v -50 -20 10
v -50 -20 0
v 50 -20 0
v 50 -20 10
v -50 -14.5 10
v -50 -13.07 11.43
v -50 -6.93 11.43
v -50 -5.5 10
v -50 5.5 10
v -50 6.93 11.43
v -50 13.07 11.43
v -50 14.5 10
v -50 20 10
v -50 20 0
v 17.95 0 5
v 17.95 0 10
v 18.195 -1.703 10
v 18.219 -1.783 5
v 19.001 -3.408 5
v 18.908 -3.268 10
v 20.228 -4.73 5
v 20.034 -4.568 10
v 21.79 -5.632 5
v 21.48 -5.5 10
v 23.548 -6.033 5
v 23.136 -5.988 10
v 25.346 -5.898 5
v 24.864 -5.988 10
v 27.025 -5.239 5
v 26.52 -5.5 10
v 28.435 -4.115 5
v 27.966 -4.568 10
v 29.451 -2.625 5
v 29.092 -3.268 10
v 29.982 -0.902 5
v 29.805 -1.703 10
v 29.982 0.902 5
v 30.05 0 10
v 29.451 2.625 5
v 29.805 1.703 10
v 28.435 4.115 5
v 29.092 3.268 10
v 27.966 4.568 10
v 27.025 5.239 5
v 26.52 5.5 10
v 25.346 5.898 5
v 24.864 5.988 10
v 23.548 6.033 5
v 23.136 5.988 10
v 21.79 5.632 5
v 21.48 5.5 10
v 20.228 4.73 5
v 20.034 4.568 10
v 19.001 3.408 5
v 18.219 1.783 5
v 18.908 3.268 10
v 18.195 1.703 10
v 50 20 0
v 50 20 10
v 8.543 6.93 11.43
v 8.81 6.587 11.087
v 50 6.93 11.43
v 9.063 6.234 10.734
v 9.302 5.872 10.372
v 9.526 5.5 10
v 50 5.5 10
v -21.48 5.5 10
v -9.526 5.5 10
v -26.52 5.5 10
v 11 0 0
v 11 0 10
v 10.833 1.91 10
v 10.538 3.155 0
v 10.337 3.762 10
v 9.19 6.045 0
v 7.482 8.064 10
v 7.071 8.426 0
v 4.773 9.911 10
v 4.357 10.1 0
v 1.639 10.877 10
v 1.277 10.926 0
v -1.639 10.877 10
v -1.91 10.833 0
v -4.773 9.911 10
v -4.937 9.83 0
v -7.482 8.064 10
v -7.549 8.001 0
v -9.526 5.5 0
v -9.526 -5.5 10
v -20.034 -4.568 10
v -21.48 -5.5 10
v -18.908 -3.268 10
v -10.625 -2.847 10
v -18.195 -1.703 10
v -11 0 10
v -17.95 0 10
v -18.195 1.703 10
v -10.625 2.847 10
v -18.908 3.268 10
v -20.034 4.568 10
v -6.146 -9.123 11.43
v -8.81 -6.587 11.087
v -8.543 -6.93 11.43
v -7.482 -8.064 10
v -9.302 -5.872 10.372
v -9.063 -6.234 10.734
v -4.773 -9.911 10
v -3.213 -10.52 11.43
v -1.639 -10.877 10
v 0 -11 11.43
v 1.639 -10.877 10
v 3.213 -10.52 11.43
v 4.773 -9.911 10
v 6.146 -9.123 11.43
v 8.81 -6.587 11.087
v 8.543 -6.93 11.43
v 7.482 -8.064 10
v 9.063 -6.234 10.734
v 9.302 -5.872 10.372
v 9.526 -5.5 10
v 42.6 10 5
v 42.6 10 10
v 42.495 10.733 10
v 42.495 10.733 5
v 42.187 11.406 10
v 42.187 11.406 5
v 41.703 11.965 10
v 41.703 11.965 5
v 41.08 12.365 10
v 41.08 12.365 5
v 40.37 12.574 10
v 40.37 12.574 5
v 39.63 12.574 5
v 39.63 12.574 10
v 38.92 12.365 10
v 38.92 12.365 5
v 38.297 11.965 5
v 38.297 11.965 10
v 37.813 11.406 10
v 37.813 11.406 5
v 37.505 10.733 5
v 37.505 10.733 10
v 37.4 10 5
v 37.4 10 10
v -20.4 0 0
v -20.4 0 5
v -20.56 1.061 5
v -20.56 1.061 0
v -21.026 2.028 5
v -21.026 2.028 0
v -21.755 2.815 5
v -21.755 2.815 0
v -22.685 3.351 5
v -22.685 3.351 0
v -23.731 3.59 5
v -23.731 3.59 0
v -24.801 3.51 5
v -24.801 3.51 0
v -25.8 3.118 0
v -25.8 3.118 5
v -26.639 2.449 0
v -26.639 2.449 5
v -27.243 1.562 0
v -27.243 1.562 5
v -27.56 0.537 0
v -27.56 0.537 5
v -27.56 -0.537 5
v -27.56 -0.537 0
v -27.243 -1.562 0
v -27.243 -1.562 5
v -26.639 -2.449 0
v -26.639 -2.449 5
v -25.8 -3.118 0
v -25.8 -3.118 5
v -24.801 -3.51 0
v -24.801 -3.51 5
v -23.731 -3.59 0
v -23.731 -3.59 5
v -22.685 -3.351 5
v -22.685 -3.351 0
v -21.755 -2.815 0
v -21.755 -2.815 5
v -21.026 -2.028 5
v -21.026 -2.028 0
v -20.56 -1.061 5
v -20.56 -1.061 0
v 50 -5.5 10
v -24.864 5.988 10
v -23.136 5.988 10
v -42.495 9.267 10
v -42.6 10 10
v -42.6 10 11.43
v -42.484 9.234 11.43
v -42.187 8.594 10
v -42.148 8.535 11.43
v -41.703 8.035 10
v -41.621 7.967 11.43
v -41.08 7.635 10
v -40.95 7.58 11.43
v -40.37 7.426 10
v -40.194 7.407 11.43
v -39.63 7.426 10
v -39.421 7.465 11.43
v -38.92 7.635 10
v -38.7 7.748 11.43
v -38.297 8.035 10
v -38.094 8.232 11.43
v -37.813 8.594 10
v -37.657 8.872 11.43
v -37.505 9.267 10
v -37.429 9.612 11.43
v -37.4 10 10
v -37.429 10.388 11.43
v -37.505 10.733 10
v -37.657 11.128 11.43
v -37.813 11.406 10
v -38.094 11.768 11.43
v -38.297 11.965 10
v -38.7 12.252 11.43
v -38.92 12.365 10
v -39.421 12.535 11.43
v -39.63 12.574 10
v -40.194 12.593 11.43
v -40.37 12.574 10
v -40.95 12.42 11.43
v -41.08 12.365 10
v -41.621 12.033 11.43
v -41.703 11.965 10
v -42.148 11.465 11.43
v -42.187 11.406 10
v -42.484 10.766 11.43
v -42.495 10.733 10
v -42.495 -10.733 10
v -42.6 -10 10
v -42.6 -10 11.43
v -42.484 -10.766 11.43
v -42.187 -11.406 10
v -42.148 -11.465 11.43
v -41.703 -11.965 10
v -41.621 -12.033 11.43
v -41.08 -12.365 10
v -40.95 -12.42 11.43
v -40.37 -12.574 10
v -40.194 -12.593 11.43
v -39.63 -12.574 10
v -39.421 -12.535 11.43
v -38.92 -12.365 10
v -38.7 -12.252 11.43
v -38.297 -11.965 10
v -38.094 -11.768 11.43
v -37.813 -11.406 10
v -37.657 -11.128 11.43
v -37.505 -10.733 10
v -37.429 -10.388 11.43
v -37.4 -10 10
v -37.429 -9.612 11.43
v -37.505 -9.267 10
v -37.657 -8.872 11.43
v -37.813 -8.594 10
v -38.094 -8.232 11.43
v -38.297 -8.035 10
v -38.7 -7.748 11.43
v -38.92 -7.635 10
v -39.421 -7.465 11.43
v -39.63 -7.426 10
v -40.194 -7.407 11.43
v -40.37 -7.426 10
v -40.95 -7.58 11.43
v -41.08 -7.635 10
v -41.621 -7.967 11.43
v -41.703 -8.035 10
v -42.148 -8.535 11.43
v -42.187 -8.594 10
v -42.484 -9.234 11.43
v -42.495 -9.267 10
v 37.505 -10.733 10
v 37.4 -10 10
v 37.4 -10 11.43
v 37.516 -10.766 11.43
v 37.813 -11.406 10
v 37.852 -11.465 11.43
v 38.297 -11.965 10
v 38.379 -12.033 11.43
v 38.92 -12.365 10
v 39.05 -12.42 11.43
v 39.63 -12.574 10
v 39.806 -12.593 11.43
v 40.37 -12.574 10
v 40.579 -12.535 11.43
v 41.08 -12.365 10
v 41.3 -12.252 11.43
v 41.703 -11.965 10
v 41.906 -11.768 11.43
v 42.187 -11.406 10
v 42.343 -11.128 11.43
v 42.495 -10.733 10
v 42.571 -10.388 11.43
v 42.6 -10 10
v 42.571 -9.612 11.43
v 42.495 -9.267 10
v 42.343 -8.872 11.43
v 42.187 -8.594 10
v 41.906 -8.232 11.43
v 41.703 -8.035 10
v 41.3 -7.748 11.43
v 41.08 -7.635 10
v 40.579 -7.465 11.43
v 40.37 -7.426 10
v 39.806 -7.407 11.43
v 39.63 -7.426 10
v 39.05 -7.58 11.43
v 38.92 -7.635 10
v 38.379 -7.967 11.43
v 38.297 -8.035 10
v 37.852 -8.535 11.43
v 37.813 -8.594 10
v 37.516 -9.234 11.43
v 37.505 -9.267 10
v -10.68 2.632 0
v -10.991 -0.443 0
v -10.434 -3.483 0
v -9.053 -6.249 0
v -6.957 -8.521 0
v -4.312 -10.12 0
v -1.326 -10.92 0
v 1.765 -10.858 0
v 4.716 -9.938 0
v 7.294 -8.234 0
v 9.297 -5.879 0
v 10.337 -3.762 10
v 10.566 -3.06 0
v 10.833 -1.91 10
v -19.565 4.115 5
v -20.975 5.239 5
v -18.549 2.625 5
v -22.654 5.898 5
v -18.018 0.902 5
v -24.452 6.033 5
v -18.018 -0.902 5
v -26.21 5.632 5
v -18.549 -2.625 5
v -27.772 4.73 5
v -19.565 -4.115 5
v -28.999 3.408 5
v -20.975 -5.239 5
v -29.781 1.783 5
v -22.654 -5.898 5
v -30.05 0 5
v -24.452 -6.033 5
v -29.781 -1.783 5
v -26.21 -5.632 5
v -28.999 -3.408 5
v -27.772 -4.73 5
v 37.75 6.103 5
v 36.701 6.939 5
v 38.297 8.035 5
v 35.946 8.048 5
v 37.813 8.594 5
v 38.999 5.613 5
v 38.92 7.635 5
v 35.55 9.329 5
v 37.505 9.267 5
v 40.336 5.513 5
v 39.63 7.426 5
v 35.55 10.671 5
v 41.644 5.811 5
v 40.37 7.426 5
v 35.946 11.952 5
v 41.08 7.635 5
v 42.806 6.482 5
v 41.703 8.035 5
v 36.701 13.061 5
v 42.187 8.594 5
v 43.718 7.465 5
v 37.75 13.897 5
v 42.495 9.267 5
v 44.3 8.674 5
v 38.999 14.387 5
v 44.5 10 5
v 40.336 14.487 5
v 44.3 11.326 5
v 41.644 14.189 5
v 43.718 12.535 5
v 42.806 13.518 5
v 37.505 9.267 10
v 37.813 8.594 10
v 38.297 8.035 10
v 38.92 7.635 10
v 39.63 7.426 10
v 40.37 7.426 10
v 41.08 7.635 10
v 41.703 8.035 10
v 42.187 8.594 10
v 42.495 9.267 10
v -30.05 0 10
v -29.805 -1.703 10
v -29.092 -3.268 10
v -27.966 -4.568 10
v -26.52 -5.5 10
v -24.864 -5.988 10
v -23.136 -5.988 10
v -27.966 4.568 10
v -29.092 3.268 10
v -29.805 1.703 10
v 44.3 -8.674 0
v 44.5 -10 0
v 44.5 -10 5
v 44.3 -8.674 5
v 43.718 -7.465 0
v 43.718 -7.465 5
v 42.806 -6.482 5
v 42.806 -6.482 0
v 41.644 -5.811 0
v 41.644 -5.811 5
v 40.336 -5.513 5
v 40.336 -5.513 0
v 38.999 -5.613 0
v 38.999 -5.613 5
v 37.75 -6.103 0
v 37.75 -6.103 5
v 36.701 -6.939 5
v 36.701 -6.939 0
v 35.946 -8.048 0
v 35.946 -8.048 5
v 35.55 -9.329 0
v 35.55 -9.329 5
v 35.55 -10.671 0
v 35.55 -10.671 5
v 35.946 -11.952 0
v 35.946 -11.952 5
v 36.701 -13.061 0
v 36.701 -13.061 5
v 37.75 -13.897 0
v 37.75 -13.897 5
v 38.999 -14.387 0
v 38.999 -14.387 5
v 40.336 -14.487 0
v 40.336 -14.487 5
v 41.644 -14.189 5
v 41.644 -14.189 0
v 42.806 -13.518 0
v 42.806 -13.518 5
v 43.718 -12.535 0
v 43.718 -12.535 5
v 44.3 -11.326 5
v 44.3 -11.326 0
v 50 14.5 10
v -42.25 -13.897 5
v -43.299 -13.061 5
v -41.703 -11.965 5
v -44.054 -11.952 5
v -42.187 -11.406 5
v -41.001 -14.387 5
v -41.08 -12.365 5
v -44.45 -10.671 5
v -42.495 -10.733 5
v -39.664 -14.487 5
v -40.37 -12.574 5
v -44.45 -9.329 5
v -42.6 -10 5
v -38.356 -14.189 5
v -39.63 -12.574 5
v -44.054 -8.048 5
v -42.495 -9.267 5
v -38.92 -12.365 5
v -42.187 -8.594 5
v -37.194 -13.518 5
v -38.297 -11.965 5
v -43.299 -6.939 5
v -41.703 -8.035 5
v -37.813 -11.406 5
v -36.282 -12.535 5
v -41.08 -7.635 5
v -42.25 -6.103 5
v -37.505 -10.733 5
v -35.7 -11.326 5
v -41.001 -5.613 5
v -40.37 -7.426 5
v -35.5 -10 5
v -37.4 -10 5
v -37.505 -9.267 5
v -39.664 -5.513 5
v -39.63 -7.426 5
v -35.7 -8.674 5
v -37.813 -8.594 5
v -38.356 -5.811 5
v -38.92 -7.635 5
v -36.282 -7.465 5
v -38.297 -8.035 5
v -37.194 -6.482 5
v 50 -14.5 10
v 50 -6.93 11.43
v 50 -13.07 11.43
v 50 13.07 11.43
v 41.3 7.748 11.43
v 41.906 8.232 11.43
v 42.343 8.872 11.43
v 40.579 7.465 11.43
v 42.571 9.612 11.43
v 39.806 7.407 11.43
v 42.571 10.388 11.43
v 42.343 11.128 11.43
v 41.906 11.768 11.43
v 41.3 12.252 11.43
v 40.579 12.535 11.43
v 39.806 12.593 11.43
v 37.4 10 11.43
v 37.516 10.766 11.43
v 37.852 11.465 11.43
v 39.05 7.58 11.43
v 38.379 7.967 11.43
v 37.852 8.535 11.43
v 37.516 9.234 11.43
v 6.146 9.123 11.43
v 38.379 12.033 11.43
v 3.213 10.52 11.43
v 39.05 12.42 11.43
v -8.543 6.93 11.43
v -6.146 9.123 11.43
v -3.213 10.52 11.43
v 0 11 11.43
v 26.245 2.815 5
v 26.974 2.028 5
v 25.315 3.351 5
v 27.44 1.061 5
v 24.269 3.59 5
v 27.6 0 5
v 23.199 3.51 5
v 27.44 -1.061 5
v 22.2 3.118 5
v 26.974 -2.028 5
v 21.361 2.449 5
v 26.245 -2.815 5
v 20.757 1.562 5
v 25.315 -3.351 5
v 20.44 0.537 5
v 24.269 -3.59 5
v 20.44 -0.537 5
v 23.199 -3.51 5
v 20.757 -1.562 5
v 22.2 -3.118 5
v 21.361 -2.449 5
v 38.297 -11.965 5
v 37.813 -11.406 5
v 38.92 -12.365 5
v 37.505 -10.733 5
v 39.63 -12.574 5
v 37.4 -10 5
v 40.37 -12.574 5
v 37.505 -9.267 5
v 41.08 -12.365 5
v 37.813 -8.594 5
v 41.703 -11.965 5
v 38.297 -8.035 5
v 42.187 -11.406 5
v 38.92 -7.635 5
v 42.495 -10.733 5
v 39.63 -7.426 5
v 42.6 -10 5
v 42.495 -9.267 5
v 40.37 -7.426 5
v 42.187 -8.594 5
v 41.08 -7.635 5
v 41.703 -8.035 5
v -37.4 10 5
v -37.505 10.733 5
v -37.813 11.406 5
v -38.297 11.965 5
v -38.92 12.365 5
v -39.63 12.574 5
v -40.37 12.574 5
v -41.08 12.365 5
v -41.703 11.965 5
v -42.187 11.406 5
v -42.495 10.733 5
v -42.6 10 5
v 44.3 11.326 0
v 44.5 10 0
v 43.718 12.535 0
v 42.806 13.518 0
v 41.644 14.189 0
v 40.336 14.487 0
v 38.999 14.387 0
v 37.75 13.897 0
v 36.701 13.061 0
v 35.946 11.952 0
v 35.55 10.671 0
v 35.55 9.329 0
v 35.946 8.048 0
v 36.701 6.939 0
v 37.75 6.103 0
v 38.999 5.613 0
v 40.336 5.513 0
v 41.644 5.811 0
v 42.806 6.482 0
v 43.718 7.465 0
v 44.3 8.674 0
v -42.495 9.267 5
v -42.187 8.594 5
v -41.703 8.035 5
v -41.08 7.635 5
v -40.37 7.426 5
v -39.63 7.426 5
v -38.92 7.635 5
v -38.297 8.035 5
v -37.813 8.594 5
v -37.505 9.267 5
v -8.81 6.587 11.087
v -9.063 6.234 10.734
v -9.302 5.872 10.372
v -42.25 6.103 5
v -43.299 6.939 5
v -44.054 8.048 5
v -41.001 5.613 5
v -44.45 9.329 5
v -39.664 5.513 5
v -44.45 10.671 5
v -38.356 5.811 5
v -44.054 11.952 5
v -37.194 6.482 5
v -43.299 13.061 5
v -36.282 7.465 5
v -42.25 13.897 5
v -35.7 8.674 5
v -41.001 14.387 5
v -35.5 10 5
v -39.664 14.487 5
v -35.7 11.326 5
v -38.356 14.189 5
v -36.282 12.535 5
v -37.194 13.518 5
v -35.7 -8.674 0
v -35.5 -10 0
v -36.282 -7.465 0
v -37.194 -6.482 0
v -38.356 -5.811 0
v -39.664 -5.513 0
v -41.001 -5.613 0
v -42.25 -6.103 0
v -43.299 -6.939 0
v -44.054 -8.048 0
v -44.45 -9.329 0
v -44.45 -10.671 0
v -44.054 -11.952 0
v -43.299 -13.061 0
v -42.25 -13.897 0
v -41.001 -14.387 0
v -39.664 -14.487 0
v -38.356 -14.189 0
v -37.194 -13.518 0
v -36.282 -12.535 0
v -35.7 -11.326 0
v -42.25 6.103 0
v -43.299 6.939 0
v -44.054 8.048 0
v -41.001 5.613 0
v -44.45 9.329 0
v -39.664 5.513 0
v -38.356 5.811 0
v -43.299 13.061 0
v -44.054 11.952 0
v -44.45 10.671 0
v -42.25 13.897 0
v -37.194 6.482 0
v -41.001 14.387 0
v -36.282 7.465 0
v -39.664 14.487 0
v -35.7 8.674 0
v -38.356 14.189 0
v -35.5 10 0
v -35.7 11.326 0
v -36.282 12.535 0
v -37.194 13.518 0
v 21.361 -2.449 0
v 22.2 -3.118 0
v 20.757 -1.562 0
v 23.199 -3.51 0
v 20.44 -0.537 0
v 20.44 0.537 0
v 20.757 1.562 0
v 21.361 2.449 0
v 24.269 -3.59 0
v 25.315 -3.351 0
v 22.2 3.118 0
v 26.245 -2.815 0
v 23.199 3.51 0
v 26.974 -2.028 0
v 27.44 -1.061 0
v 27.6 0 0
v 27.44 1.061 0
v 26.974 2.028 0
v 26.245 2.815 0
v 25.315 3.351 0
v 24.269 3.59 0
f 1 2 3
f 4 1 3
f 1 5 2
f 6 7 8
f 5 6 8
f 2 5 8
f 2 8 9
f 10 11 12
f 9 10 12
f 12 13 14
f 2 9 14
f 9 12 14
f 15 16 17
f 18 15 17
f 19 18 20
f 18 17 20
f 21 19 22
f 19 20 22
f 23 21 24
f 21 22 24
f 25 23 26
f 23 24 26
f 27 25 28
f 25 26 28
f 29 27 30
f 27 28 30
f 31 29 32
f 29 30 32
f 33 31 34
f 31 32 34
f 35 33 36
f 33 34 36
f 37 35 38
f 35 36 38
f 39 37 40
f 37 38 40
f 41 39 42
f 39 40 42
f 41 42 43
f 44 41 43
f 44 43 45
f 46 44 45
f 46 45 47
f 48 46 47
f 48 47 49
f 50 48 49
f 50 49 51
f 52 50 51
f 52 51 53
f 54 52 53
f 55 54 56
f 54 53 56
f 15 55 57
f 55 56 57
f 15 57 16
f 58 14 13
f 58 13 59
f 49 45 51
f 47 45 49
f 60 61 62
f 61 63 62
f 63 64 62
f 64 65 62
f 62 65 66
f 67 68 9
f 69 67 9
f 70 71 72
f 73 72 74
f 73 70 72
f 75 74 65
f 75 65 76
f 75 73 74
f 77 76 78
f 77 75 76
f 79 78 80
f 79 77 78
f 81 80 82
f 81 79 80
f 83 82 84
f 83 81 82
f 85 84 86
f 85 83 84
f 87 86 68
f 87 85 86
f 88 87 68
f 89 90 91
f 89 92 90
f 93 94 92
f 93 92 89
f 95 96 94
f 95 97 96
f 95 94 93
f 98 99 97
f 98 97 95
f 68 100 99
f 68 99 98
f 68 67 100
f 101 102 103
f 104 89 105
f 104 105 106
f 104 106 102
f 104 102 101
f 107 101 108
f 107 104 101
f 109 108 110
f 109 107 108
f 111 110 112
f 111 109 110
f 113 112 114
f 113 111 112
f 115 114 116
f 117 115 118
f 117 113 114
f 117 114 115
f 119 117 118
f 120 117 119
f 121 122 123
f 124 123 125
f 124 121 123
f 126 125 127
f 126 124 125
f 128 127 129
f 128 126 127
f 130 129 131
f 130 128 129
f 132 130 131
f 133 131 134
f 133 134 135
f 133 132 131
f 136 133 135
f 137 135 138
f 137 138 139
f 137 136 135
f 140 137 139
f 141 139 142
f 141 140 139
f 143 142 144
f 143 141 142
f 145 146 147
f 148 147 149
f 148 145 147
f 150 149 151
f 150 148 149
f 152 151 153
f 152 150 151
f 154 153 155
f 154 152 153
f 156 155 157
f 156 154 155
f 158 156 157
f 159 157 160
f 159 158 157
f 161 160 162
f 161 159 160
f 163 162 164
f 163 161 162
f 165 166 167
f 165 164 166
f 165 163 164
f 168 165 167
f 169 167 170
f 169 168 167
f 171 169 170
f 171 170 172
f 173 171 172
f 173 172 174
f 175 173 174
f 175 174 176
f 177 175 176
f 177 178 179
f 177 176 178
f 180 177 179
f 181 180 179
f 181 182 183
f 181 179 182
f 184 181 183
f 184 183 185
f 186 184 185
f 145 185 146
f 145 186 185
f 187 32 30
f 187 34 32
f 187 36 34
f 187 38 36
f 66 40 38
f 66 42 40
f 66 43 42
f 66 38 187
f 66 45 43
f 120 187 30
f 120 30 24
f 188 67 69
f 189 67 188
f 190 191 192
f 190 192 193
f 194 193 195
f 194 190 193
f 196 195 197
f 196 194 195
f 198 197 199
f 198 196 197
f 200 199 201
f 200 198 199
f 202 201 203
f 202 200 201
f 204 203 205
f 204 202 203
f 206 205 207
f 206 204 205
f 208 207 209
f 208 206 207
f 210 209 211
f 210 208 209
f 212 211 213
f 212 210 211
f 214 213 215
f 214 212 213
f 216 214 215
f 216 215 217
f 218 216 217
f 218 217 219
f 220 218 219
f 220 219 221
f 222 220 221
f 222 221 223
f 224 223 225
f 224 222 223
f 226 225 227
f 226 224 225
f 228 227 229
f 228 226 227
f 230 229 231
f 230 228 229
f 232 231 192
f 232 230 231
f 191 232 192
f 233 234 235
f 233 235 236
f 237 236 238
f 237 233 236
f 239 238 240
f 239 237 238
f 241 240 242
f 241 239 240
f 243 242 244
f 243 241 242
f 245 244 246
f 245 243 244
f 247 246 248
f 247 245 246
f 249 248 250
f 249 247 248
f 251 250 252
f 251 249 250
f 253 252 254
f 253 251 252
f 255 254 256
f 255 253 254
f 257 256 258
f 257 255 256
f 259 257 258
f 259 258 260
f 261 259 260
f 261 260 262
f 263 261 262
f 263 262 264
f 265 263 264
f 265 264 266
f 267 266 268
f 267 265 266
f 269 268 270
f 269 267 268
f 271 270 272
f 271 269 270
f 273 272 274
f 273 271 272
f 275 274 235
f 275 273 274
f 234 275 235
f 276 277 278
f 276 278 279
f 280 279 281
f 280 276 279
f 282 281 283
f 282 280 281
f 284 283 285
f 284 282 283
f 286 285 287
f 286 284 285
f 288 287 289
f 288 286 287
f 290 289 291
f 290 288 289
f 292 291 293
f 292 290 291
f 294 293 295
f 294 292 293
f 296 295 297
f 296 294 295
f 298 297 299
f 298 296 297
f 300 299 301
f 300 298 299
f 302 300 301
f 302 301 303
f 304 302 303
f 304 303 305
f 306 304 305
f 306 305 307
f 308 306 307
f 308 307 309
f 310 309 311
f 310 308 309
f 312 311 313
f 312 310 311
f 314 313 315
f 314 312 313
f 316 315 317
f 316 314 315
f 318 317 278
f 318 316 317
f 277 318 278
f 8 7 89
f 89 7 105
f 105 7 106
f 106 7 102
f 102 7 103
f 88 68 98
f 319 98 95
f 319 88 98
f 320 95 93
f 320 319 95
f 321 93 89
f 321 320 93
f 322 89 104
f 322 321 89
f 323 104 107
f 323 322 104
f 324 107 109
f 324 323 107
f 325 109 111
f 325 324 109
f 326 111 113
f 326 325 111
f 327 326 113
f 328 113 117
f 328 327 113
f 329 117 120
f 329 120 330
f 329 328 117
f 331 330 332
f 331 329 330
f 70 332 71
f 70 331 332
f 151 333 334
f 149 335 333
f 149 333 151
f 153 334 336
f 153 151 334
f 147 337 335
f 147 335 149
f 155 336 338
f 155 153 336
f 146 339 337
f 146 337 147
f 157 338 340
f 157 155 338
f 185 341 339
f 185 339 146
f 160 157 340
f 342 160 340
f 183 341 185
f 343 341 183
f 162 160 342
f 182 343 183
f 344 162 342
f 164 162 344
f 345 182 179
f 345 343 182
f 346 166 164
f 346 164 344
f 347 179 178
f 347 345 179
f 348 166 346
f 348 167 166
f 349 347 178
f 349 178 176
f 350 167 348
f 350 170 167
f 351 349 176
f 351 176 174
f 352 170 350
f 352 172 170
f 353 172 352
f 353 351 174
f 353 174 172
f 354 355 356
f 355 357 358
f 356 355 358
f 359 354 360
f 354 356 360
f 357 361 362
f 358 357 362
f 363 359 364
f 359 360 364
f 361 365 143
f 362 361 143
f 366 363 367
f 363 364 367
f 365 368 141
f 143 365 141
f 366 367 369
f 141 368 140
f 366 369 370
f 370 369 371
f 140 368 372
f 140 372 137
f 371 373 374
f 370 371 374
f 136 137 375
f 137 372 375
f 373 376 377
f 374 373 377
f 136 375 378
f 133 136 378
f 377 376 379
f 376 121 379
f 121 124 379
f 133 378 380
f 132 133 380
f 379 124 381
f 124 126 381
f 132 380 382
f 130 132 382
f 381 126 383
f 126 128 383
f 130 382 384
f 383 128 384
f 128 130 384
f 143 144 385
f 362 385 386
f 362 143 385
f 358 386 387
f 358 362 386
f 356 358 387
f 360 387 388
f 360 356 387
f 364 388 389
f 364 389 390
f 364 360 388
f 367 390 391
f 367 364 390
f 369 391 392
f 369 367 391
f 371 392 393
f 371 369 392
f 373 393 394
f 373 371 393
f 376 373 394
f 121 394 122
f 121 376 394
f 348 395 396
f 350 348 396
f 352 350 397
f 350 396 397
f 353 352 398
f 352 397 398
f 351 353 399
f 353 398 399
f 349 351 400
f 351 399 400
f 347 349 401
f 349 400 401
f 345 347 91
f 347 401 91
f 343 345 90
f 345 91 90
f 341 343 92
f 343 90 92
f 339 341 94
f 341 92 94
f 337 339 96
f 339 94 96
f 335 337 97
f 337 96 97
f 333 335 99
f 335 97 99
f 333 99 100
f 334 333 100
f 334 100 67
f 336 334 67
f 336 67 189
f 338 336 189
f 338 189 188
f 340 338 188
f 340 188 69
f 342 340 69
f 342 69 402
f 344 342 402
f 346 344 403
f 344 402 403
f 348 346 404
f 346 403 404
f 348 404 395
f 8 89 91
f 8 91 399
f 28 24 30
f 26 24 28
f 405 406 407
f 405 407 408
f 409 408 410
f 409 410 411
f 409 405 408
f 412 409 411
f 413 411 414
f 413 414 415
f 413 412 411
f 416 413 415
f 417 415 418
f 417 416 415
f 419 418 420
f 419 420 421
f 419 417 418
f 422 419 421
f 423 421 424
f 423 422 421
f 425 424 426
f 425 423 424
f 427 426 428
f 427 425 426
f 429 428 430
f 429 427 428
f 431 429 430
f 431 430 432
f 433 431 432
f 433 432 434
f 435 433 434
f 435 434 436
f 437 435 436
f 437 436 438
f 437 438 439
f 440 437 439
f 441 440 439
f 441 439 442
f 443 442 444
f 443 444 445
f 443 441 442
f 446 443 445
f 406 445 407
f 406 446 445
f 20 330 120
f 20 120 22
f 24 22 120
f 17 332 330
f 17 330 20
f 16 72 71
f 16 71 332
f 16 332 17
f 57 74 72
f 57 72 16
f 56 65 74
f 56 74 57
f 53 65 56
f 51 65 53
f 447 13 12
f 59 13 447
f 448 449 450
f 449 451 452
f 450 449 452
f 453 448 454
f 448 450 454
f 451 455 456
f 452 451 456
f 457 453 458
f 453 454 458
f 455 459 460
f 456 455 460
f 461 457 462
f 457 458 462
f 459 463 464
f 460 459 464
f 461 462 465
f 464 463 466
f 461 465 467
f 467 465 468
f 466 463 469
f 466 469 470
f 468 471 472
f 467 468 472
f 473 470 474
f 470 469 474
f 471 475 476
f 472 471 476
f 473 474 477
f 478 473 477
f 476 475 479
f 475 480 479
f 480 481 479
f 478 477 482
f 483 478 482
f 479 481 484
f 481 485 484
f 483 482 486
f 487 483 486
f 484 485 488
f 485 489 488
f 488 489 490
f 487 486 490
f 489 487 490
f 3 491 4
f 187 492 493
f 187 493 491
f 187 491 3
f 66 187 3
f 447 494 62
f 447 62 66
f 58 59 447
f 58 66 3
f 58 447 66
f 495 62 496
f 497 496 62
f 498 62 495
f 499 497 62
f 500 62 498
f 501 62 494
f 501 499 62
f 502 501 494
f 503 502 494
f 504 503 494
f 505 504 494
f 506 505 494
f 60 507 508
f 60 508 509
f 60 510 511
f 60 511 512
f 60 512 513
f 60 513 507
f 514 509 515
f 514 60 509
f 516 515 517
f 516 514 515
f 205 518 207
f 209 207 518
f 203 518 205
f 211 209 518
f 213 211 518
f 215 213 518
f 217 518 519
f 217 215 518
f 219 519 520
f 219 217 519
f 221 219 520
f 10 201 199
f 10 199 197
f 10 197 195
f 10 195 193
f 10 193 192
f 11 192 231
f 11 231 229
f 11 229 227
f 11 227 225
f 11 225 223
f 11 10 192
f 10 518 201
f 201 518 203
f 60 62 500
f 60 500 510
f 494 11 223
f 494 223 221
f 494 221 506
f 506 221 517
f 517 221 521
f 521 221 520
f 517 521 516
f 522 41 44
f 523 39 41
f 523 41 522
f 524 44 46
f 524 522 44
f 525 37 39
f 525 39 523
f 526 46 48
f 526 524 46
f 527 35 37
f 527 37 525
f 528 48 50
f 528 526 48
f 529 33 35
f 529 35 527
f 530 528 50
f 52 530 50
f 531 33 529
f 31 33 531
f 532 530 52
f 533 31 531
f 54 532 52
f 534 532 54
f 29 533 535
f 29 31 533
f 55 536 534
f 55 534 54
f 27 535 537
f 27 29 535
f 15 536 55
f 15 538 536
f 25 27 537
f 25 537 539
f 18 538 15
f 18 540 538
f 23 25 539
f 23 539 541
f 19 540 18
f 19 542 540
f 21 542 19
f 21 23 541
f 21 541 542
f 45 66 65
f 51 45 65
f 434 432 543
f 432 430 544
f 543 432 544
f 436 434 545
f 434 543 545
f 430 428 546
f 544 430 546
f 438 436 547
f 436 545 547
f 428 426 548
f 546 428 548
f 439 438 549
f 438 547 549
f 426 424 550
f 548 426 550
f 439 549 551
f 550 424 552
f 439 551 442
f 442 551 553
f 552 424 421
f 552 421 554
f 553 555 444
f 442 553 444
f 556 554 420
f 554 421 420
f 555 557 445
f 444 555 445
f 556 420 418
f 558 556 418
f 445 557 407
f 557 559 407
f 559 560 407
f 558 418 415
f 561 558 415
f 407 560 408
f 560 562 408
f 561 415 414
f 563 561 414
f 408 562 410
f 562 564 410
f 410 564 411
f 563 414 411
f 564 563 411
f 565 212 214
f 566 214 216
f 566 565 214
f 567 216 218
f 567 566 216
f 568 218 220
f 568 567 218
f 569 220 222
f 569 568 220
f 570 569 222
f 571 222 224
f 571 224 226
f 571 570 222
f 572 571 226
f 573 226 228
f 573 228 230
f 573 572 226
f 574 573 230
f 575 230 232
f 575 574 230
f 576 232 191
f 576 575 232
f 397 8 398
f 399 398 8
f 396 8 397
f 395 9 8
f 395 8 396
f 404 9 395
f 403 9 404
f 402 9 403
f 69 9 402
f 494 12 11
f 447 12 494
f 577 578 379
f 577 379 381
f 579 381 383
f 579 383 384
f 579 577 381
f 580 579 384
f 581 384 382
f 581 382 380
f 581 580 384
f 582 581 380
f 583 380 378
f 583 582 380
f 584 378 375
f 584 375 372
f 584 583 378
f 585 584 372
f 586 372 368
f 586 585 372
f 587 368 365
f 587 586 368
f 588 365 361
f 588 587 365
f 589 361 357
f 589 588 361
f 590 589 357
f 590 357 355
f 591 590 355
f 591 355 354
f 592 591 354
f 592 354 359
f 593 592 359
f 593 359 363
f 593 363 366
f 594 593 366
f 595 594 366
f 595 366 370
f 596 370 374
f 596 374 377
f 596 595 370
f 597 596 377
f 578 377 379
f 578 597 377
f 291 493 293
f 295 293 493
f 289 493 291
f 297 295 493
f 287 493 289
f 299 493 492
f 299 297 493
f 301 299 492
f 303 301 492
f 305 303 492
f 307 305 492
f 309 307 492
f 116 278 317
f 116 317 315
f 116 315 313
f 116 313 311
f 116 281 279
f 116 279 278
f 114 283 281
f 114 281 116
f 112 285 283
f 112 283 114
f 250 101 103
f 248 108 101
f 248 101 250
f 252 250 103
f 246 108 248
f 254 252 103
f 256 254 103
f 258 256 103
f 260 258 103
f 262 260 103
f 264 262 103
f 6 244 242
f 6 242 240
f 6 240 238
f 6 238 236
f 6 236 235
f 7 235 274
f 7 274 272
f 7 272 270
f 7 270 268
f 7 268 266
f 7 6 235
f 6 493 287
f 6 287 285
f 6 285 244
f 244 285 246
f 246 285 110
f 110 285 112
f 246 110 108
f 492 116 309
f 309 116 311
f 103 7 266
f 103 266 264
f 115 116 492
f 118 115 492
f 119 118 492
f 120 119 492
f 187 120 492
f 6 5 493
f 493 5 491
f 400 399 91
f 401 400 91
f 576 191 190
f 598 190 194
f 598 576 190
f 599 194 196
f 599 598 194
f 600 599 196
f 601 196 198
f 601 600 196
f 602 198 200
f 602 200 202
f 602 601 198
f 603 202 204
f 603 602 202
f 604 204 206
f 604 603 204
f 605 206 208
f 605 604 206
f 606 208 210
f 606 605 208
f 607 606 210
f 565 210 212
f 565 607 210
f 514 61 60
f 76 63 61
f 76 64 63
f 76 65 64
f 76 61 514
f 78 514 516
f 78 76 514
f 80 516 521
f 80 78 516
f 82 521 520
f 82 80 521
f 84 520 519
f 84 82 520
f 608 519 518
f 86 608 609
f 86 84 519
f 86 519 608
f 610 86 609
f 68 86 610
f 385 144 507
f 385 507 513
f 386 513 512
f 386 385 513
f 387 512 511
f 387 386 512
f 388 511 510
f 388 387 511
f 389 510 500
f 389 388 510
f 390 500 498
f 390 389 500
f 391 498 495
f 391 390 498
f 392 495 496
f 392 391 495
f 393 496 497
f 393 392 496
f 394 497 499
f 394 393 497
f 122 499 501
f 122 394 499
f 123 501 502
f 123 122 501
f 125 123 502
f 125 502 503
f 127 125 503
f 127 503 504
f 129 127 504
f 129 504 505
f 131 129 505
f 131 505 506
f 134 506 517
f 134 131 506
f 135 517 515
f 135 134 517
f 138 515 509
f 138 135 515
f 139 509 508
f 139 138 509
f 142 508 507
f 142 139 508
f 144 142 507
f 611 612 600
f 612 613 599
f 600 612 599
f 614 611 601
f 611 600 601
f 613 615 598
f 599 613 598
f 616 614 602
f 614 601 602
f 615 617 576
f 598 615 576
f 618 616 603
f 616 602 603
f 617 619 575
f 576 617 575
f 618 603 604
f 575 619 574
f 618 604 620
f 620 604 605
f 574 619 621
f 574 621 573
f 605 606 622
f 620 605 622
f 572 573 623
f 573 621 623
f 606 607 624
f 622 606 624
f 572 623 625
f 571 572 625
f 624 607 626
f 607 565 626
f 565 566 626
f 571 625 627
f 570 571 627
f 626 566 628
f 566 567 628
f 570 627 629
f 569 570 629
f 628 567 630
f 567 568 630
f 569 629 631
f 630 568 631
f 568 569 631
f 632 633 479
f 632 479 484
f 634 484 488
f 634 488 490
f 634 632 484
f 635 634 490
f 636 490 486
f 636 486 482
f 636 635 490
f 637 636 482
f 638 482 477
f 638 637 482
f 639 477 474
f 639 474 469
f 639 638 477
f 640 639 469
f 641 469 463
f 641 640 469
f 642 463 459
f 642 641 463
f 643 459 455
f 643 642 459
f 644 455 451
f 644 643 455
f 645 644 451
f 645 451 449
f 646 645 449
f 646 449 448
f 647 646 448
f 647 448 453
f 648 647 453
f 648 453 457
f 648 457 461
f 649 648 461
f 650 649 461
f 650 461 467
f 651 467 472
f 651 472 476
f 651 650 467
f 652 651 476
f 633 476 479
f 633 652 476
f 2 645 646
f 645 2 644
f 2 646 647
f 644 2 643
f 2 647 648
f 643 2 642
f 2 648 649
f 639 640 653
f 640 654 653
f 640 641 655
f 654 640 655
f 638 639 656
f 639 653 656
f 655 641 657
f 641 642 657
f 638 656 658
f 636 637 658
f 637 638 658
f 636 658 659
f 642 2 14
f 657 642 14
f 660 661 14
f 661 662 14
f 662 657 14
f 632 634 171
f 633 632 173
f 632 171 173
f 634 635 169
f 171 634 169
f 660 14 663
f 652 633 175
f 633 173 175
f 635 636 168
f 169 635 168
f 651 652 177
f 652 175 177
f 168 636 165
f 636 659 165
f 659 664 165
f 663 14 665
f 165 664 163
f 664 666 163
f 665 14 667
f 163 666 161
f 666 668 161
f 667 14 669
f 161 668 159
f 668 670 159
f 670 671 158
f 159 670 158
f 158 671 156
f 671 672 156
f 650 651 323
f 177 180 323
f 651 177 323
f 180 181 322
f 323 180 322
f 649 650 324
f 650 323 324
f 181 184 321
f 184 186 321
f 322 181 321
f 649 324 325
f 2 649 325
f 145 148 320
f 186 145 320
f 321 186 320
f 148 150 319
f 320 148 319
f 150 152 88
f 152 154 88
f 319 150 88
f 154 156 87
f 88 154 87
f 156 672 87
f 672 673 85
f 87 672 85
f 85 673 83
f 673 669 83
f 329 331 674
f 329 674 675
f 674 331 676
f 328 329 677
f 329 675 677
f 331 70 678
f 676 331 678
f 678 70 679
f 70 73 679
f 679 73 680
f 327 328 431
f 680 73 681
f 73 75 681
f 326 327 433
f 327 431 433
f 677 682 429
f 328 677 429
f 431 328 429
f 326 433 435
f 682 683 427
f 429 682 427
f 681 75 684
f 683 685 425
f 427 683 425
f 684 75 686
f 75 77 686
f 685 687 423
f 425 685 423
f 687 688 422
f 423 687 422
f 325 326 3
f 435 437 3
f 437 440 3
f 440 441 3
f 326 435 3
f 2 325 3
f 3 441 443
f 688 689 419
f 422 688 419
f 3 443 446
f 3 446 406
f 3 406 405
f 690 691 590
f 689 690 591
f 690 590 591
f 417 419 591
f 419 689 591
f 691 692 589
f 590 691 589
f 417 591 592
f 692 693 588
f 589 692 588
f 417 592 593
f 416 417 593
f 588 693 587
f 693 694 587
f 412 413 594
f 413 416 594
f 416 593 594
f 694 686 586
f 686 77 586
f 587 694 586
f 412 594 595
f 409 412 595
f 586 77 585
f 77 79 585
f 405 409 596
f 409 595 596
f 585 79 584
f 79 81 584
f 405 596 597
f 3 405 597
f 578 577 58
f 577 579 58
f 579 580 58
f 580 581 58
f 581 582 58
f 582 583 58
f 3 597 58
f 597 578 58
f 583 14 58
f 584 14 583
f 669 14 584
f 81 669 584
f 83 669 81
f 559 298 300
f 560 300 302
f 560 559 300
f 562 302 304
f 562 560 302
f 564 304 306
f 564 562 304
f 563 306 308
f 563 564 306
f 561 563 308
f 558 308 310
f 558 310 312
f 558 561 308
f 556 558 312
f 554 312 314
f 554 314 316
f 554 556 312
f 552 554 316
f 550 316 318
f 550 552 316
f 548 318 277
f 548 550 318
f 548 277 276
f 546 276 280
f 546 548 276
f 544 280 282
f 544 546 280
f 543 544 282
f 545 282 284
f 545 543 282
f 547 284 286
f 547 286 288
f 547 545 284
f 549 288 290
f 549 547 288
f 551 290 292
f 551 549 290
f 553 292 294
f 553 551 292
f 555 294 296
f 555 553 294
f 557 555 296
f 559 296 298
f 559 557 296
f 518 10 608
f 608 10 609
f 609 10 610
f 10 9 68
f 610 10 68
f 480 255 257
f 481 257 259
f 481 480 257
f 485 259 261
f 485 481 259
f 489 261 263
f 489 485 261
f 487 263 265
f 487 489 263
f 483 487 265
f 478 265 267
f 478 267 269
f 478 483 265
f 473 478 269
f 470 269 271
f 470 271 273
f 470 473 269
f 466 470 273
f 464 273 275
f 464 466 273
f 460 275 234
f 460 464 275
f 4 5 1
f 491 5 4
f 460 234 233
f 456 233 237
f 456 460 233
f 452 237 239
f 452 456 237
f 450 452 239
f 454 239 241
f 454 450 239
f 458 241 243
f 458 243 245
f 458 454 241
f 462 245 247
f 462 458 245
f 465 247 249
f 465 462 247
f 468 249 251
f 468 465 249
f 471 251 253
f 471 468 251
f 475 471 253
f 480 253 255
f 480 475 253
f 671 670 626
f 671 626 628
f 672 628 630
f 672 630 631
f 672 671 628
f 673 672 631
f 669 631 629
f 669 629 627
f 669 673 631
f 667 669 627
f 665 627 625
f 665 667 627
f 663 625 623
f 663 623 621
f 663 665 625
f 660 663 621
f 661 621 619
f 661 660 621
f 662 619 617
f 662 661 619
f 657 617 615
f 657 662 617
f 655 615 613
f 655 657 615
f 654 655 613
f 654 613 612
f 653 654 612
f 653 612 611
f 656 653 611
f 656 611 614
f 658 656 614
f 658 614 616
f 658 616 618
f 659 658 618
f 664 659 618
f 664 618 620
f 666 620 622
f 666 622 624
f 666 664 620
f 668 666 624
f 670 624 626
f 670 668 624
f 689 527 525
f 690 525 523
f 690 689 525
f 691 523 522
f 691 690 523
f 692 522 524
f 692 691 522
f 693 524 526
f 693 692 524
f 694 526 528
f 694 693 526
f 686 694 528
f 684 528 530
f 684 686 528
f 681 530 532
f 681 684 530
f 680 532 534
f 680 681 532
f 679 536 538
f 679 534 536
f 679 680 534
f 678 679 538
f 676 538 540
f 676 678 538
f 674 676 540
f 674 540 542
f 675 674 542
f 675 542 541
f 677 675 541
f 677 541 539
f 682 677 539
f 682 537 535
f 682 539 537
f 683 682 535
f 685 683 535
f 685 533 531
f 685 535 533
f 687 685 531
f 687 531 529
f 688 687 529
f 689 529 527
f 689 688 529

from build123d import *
from build123d.topology import SkipClean

# Parameters (mm, degrees)
SKETCH1_W               = 100
SKETCH1_H               = 40
SKETCH1_R               = 11
SKETCH1_R_2             = 2.6
SKETCH1_R_3             = 3.6
BOSS_EXTRUDE1_DEPTH     = 10
CUT_EXTRUDE1_START      = 10
SKETCH2_R               = 6.05
CUT_EXTRUDE1_DEPTH      = 5
SKETCH3_R               = 4.5
CUT_EXTRUDE2_DEPTH      = 5
BOSS_EXTRUDE3_START     = -50
SKETCH4_W               = 1.43
SKETCH4_H               = 9
BOSS_EXTRUDE3_DEPTH     = 100
CHAMFER1_SIZE           = 1.43
CUT_EXTRUDE4_DEPTH      = 56.051293354
CUT_EXTRUDE4_DEPTH_BACK = 56.051293354
SKETCH5_R               = 11
SKETCH5_R_2             = 2.6


with BuildPart() as part:
    # Sketch1 → Boss-Extrude1 (new body)
    with BuildSketch(Plane.XY):
        Rectangle(SKETCH1_W, SKETCH1_H)
        Circle(SKETCH1_R, mode=Mode.SUBTRACT)
        with Locations((-40, 10)):
            Circle(SKETCH1_R_2, mode=Mode.SUBTRACT)
        with Locations((-40, -10)):
            Circle(SKETCH1_R_2, mode=Mode.SUBTRACT)
        with Locations((40, 10)):
            Circle(SKETCH1_R_2, mode=Mode.SUBTRACT)
        with Locations((40, -10)):
            Circle(SKETCH1_R_2, mode=Mode.SUBTRACT)
        with Locations((-24, 0)):
            Circle(SKETCH1_R_3, mode=Mode.SUBTRACT)
        with Locations((24, 0)):
            Circle(SKETCH1_R_3, mode=Mode.SUBTRACT)
    extrude(amount=BOSS_EXTRUDE1_DEPTH)

    # Sketch2 → Cut-Extrude1 (cut)
    with BuildSketch(Plane.XY.offset(CUT_EXTRUDE1_START)):
        with Locations(Location((24, 0, 0), (0, 0, 180))):
            Circle(SKETCH2_R)
        with Locations(Location((-24, 0, 0), (0, 0, 180))):
            Circle(SKETCH2_R)
    extrude(amount=-CUT_EXTRUDE1_DEPTH, mode=Mode.SUBTRACT)

    # Sketch3 → Cut-Extrude2 (cut)
    with BuildSketch(Plane.XY):
        with Locations((40, 10)):
            Circle(SKETCH3_R)
        with Locations((40, -10)):
            Circle(SKETCH3_R)
        with Locations((-40, 10)):
            Circle(SKETCH3_R)
        with Locations((-40, -10)):
            Circle(SKETCH3_R)
    extrude(amount=CUT_EXTRUDE2_DEPTH, mode=Mode.SUBTRACT)

    # Sketch4 → Boss-Extrude3 (add)
    with BuildSketch(Plane(origin=(0, 0, 0), x_dir=(0, 0, -1), z_dir=(1, 0, 0)).offset(BOSS_EXTRUDE3_START)):
        with Locations((-10.715, 10)):
            Rectangle(SKETCH4_W, SKETCH4_H)
        with Locations((-10.715, -10)):
            Rectangle(SKETCH4_W, SKETCH4_H)
    extrude(amount=BOSS_EXTRUDE3_DEPTH)

    # Chamfer1
    chamfer1_edges = [part.edges().sort_by_distance(p)[0] for p in [
        (0, -14.5, 11.43),
        (0, -5.5, 11.43),
        (0, 5.5, 11.43),
        (0, 14.5, 11.43),
    ]]
    chamfer(chamfer1_edges, length=CHAMFER1_SIZE - 0.0001)  # a hair under: the kernel refuses the full size

    # Sketch5 → Cut-Extrude4 (cut, two sides: drawn at the far end of the back side and taken through both)
    with SkipClean():  # the faces are left unmerged after this step: merging them gives an invalid solid
        with BuildSketch(Plane.XY.offset(-CUT_EXTRUDE4_DEPTH_BACK)):
            with Locations(Location((0, 0, 0), (0, 0, 150))):
                Circle(SKETCH5_R)
            with Locations(Location((-40, 10, 0), (0, 0, 180))):
                Circle(SKETCH5_R_2)
            with Locations(Location((-40, -10, 0), (0, 0, 180))):
                Circle(SKETCH5_R_2)
            with Locations(Location((40, -10, 0), (0, 0, 180))):
                Circle(SKETCH5_R_2)
            with Locations(Location((40, 10, 0), (0, 0, 180))):
                Circle(SKETCH5_R_2)
        extrude(amount=CUT_EXTRUDE4_DEPTH + CUT_EXTRUDE4_DEPTH_BACK, mode=Mode.SUBTRACT)


solid = part.part
